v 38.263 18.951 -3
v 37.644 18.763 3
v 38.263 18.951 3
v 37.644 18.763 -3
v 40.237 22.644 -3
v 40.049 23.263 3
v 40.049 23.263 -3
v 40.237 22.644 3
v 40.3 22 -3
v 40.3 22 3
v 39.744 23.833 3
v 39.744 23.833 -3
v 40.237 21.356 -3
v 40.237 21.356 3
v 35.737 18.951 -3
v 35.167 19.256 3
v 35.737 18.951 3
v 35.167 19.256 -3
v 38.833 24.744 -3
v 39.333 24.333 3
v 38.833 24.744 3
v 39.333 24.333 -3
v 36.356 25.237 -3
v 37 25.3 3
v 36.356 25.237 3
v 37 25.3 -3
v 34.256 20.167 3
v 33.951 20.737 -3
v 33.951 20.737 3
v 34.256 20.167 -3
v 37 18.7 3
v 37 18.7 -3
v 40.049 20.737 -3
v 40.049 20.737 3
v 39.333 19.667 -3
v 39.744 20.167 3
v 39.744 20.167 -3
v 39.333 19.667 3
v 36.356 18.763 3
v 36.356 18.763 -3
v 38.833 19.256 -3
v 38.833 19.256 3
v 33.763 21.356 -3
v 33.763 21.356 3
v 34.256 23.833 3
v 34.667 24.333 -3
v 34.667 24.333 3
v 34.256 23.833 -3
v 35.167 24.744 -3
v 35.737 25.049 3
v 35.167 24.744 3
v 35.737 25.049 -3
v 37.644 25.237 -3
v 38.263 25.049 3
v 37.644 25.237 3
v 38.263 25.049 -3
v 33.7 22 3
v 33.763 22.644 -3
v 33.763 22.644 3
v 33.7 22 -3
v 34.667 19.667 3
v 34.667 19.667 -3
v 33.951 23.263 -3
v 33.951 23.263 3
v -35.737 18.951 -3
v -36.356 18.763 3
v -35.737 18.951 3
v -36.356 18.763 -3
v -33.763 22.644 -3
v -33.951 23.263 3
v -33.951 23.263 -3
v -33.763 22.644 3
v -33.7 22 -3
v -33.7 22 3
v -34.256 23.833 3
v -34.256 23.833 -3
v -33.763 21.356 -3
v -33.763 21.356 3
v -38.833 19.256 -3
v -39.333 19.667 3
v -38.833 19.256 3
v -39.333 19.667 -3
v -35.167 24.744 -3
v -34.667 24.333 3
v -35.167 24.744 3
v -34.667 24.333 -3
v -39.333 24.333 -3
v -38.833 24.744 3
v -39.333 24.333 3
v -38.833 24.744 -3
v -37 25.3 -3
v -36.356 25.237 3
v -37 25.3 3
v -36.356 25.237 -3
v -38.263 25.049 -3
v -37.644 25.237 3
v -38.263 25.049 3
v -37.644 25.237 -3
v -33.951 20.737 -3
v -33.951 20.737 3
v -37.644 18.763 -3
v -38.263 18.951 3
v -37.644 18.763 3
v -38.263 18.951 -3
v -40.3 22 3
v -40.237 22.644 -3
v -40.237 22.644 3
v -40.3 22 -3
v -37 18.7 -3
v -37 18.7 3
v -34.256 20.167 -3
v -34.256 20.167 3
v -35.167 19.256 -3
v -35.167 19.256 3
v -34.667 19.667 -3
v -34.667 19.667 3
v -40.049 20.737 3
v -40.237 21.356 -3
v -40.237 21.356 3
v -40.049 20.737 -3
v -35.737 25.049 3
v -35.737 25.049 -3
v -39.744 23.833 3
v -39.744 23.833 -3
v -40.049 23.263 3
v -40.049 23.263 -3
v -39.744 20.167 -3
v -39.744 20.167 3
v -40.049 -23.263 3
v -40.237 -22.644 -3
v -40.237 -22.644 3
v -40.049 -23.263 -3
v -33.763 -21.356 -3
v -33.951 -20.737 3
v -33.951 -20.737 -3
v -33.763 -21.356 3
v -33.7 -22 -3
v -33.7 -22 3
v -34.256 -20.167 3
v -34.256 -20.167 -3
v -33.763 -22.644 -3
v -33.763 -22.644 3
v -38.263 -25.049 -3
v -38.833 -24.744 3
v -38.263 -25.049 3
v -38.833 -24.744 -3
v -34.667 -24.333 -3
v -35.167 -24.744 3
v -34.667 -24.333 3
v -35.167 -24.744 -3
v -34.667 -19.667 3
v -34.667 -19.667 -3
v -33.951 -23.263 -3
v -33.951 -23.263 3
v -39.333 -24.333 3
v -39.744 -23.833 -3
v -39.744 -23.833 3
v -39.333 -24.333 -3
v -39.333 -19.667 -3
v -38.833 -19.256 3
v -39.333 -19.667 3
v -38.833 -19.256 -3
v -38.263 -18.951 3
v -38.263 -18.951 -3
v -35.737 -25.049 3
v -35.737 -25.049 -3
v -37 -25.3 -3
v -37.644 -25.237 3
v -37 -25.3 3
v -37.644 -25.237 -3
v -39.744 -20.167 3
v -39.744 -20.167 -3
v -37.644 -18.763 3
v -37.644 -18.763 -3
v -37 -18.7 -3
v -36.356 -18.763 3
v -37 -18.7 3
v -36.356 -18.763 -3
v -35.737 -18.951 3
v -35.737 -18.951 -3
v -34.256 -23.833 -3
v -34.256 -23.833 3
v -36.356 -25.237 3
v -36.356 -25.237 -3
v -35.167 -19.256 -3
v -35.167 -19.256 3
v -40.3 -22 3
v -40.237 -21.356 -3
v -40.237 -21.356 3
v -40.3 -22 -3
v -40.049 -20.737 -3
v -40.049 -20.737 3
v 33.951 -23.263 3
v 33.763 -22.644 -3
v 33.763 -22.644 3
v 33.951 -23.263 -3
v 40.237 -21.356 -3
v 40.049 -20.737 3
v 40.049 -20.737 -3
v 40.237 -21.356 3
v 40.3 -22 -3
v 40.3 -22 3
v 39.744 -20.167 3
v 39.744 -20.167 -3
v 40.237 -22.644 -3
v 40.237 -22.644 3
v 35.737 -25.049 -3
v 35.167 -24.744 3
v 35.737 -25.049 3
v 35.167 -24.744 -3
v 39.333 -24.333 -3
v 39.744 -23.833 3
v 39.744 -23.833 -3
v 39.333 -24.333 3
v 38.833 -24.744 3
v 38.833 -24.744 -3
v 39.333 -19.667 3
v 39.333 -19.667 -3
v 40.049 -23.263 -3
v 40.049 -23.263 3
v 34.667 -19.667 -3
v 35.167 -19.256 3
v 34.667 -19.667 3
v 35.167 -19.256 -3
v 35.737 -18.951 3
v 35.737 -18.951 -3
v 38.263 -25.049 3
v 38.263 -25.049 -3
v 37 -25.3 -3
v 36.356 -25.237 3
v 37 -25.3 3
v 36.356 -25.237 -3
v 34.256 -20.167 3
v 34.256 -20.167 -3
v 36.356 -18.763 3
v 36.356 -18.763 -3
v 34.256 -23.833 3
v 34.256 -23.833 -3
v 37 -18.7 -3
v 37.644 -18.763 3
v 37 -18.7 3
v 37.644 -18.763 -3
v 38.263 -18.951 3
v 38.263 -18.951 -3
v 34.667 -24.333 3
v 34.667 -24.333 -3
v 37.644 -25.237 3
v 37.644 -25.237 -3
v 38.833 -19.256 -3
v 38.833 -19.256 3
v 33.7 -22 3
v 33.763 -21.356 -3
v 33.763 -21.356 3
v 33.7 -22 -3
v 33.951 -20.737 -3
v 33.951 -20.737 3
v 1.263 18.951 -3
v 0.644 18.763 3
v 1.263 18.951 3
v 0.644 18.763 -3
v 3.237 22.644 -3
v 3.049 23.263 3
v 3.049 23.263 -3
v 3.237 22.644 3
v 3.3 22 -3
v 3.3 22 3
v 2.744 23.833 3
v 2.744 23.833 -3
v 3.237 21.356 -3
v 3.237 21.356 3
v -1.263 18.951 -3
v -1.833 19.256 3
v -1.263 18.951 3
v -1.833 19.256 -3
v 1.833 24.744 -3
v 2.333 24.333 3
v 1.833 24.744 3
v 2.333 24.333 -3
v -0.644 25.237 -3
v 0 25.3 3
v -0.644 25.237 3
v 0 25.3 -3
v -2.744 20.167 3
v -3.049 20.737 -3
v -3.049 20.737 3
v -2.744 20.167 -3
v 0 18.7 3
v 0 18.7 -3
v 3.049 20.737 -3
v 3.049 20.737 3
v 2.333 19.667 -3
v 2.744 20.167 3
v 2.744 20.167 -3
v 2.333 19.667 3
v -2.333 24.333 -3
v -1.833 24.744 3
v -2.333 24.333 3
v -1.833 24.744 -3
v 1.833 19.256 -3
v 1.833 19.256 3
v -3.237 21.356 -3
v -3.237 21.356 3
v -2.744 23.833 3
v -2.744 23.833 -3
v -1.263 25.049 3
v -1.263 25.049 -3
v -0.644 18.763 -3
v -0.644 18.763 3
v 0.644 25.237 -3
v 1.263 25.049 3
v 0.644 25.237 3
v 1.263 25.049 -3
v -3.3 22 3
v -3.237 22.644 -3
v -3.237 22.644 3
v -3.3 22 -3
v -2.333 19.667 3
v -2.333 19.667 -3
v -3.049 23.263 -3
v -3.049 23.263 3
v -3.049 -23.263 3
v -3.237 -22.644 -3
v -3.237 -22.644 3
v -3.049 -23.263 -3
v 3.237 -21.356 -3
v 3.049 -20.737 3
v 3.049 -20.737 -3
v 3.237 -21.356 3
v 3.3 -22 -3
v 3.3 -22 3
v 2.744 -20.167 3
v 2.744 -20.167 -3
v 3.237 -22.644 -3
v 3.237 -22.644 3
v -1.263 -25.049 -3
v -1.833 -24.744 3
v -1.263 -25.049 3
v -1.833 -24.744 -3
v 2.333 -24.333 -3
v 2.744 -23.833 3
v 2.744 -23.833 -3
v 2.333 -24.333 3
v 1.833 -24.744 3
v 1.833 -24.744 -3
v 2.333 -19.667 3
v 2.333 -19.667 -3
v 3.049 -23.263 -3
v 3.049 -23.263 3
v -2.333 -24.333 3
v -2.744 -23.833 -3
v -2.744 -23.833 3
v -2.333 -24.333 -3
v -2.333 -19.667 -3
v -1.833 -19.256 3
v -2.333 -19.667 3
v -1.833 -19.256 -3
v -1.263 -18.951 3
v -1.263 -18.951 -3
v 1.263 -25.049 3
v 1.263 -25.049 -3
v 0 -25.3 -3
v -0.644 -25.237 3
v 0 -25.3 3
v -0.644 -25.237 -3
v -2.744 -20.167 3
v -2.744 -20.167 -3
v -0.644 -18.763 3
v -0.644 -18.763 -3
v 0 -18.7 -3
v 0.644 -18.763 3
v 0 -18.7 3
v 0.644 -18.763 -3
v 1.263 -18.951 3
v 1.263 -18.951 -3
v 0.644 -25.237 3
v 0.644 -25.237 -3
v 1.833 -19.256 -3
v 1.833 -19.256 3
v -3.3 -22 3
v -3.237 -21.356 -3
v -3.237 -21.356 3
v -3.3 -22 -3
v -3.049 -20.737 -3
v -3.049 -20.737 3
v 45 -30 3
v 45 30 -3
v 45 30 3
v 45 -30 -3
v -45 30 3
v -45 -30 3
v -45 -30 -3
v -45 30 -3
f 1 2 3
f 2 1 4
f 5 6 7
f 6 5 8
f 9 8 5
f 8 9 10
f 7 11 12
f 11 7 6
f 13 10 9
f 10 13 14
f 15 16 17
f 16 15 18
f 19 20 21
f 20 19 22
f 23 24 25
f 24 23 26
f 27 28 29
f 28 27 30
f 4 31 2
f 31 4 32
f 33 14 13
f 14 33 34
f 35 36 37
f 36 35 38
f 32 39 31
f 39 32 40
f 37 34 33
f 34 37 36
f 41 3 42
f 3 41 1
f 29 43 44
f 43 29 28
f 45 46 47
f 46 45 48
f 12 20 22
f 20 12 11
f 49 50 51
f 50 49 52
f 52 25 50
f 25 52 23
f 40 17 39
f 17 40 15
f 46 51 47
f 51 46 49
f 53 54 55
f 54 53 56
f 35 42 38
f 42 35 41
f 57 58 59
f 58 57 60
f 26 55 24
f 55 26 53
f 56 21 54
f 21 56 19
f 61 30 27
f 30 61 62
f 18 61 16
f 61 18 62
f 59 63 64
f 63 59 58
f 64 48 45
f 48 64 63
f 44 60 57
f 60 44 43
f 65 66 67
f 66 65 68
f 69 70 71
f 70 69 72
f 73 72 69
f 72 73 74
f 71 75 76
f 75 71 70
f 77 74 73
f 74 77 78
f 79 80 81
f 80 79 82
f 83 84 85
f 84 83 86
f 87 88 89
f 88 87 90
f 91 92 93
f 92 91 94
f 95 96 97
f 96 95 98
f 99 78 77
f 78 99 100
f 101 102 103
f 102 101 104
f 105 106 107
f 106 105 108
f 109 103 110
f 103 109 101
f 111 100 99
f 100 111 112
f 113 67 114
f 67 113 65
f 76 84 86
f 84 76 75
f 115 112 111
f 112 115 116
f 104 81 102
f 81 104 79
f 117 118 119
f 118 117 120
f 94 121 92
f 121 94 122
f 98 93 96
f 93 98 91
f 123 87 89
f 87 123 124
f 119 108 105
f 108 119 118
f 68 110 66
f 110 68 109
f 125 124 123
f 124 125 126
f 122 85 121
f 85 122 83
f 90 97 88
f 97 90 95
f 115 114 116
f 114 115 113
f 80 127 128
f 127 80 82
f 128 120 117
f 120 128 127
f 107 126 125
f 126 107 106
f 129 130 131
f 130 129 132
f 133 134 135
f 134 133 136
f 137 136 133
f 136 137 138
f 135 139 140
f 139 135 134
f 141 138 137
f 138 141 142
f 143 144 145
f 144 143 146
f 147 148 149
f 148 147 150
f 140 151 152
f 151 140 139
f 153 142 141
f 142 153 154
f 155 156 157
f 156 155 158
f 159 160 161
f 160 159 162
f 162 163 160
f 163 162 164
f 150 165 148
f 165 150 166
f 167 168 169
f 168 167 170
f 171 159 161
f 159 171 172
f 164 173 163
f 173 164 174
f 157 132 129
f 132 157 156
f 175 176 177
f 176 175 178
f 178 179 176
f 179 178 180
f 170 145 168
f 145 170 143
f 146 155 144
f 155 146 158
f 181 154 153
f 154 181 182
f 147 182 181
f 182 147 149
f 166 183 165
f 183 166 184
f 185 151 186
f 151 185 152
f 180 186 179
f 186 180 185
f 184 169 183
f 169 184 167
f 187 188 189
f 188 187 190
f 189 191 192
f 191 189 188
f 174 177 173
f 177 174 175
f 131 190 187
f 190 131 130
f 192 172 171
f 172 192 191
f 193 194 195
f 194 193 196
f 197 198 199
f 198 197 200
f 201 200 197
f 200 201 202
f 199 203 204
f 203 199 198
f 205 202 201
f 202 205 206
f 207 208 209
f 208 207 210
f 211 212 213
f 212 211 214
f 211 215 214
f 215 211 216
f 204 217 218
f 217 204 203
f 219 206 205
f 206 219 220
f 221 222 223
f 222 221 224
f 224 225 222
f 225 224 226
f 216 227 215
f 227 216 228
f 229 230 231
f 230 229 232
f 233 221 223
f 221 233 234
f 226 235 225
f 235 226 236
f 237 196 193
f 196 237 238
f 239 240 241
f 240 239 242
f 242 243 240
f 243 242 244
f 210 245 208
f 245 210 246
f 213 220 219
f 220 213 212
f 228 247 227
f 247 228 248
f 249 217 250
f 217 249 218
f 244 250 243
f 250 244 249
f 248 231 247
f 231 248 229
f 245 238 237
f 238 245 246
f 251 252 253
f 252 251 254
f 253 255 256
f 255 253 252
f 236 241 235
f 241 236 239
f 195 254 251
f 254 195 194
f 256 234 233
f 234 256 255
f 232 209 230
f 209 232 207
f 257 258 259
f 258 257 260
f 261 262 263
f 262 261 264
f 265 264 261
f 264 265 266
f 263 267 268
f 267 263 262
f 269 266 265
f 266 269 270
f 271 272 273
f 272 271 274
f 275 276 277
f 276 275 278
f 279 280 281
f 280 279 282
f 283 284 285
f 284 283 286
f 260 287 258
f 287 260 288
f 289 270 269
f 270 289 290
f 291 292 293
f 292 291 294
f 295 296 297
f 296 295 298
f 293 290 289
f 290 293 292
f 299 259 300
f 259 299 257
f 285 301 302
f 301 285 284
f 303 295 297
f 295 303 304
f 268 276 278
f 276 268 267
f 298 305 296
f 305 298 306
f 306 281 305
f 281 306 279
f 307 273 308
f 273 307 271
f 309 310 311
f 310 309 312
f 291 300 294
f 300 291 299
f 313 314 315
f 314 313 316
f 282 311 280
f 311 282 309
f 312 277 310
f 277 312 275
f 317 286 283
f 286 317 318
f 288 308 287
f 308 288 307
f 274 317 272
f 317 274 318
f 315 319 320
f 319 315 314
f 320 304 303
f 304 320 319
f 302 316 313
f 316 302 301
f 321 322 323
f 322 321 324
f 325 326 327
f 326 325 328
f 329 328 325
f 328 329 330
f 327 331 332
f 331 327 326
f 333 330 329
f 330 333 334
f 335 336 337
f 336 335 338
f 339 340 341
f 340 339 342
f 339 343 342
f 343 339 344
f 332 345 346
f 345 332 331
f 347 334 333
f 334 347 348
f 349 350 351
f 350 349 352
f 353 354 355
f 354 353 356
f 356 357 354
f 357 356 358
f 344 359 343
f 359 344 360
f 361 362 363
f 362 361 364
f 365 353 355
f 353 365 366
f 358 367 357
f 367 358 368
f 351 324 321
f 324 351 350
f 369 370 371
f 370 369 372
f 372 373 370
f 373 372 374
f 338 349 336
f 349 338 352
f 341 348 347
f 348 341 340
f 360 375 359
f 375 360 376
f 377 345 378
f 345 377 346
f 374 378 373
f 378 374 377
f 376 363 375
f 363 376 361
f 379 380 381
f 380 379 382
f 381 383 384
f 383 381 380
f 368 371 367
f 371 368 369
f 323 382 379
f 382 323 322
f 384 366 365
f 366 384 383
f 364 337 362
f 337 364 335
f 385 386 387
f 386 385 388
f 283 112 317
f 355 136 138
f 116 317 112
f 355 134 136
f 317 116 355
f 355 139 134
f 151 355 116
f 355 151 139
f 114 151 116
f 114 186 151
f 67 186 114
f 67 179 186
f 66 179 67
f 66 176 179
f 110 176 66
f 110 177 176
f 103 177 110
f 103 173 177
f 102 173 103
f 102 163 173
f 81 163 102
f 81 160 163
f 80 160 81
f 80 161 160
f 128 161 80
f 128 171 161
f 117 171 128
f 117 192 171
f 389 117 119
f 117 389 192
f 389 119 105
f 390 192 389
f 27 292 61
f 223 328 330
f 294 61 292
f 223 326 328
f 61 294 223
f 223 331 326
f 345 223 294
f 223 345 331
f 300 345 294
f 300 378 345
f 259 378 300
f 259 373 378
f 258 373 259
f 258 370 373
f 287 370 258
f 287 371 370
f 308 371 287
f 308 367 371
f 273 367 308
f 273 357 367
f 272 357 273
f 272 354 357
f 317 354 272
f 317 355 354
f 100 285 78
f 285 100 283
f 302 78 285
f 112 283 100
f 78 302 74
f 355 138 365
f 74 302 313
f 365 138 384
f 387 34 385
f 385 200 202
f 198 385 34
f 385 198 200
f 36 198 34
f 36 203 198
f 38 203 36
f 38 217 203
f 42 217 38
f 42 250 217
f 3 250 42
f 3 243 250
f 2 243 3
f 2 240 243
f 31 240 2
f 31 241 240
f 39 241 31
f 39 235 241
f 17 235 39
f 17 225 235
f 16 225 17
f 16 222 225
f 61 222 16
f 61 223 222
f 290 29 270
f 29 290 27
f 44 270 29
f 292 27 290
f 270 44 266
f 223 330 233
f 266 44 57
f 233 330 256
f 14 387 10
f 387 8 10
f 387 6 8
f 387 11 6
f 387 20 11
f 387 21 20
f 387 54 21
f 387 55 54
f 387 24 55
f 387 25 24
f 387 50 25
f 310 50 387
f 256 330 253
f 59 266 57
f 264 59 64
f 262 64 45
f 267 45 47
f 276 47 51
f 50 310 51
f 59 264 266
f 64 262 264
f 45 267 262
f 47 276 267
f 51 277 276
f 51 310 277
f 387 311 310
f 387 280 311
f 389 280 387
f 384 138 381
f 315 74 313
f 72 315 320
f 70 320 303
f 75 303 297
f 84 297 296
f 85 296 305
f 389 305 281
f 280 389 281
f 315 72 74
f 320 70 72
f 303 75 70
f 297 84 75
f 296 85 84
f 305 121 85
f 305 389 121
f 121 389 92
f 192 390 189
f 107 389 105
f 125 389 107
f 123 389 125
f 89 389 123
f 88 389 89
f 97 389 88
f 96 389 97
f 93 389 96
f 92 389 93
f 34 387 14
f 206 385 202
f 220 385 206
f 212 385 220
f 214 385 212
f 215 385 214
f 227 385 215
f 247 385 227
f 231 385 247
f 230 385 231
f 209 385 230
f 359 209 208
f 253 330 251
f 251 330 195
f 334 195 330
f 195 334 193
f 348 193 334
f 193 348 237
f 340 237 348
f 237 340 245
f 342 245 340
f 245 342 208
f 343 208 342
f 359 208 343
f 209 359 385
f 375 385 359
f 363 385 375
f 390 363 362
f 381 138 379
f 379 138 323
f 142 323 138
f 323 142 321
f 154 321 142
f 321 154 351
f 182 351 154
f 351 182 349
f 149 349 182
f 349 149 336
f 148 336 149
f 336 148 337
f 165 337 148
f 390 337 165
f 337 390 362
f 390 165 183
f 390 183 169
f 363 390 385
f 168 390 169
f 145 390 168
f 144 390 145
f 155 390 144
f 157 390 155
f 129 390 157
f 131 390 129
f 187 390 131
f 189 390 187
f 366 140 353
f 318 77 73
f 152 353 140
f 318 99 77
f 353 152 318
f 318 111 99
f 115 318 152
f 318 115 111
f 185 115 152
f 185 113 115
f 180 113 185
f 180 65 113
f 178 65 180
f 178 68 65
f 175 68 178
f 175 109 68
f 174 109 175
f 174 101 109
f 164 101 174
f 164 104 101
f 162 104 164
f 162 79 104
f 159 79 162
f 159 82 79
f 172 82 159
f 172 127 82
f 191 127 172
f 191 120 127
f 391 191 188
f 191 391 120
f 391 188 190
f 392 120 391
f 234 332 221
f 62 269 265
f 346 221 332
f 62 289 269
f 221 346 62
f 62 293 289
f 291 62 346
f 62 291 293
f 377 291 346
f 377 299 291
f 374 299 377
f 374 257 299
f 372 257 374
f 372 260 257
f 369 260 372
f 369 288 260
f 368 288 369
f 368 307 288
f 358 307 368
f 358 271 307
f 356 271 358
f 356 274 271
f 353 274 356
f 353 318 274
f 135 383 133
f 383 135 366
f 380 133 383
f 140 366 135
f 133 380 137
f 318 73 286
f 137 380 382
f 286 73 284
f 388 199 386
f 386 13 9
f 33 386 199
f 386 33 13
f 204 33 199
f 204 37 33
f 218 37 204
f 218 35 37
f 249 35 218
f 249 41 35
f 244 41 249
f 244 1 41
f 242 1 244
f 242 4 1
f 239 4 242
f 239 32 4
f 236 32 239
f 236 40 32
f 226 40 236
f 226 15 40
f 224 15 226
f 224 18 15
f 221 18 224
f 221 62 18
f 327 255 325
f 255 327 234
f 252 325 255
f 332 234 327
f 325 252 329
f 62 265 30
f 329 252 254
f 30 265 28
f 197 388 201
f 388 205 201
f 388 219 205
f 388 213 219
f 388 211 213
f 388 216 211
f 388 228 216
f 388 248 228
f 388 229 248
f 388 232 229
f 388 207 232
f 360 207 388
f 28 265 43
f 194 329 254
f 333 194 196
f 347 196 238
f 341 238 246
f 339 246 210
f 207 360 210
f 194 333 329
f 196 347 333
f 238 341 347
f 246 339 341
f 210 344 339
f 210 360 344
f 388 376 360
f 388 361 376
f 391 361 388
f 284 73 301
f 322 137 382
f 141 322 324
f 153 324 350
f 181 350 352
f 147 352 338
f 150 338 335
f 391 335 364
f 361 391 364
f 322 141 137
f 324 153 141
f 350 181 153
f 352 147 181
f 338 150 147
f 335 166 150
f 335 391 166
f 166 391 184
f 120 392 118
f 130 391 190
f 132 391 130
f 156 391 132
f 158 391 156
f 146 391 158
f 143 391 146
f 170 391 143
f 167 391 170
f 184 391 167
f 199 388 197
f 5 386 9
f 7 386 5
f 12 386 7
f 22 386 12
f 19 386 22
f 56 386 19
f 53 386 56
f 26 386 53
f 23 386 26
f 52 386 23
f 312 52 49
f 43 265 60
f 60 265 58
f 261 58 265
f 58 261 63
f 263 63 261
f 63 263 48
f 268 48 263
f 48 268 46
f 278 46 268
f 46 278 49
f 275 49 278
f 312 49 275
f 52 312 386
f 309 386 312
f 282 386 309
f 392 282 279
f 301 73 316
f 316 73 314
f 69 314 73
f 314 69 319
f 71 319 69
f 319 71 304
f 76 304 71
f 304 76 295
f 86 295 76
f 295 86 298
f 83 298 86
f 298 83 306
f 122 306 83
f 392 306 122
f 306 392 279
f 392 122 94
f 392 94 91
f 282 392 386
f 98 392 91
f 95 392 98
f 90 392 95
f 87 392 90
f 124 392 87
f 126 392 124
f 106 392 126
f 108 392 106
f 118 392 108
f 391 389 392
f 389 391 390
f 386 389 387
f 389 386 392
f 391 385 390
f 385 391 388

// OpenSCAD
$fn = 32;

// ----------------------------------------------------------------------
// Corner plate 90 x 60 x 6
// 6 holes, centres taken from the edge offset
// ----------------------------------------------------------------------

// --- parameters (mm) ---
plate = [90, 60, 6];  // overall size (x, y, z)
holes = 6;            // number of holes the drawing asks for
hole_d = 6.6;         // hole diameter
edge = 8;             // hole centre offset from the plate edge

// --- derived feature positions (mm) ---
corner_x = plate[0] / 2 - edge;  // = 37   corner hole X
corner_y = plate[1] / 2 - edge;  // = 22   corner hole Y
feature_centers = [
  [corner_x, corner_y],
  [-corner_x, corner_y],
  [-corner_x, -corner_y],
  [corner_x, -corner_y],
  [0, corner_y],
  [0, -corner_y]
];   // hole centres the loop below drills

// plate outline, every hole drilled through with the same cutters
difference() {
  cube(plate, center = true);
  for (centre = feature_centers)
    translate([centre[0], centre[1], 0])
      cylinder(d = hole_d, h = plate[2] + 2, center = true);
}
